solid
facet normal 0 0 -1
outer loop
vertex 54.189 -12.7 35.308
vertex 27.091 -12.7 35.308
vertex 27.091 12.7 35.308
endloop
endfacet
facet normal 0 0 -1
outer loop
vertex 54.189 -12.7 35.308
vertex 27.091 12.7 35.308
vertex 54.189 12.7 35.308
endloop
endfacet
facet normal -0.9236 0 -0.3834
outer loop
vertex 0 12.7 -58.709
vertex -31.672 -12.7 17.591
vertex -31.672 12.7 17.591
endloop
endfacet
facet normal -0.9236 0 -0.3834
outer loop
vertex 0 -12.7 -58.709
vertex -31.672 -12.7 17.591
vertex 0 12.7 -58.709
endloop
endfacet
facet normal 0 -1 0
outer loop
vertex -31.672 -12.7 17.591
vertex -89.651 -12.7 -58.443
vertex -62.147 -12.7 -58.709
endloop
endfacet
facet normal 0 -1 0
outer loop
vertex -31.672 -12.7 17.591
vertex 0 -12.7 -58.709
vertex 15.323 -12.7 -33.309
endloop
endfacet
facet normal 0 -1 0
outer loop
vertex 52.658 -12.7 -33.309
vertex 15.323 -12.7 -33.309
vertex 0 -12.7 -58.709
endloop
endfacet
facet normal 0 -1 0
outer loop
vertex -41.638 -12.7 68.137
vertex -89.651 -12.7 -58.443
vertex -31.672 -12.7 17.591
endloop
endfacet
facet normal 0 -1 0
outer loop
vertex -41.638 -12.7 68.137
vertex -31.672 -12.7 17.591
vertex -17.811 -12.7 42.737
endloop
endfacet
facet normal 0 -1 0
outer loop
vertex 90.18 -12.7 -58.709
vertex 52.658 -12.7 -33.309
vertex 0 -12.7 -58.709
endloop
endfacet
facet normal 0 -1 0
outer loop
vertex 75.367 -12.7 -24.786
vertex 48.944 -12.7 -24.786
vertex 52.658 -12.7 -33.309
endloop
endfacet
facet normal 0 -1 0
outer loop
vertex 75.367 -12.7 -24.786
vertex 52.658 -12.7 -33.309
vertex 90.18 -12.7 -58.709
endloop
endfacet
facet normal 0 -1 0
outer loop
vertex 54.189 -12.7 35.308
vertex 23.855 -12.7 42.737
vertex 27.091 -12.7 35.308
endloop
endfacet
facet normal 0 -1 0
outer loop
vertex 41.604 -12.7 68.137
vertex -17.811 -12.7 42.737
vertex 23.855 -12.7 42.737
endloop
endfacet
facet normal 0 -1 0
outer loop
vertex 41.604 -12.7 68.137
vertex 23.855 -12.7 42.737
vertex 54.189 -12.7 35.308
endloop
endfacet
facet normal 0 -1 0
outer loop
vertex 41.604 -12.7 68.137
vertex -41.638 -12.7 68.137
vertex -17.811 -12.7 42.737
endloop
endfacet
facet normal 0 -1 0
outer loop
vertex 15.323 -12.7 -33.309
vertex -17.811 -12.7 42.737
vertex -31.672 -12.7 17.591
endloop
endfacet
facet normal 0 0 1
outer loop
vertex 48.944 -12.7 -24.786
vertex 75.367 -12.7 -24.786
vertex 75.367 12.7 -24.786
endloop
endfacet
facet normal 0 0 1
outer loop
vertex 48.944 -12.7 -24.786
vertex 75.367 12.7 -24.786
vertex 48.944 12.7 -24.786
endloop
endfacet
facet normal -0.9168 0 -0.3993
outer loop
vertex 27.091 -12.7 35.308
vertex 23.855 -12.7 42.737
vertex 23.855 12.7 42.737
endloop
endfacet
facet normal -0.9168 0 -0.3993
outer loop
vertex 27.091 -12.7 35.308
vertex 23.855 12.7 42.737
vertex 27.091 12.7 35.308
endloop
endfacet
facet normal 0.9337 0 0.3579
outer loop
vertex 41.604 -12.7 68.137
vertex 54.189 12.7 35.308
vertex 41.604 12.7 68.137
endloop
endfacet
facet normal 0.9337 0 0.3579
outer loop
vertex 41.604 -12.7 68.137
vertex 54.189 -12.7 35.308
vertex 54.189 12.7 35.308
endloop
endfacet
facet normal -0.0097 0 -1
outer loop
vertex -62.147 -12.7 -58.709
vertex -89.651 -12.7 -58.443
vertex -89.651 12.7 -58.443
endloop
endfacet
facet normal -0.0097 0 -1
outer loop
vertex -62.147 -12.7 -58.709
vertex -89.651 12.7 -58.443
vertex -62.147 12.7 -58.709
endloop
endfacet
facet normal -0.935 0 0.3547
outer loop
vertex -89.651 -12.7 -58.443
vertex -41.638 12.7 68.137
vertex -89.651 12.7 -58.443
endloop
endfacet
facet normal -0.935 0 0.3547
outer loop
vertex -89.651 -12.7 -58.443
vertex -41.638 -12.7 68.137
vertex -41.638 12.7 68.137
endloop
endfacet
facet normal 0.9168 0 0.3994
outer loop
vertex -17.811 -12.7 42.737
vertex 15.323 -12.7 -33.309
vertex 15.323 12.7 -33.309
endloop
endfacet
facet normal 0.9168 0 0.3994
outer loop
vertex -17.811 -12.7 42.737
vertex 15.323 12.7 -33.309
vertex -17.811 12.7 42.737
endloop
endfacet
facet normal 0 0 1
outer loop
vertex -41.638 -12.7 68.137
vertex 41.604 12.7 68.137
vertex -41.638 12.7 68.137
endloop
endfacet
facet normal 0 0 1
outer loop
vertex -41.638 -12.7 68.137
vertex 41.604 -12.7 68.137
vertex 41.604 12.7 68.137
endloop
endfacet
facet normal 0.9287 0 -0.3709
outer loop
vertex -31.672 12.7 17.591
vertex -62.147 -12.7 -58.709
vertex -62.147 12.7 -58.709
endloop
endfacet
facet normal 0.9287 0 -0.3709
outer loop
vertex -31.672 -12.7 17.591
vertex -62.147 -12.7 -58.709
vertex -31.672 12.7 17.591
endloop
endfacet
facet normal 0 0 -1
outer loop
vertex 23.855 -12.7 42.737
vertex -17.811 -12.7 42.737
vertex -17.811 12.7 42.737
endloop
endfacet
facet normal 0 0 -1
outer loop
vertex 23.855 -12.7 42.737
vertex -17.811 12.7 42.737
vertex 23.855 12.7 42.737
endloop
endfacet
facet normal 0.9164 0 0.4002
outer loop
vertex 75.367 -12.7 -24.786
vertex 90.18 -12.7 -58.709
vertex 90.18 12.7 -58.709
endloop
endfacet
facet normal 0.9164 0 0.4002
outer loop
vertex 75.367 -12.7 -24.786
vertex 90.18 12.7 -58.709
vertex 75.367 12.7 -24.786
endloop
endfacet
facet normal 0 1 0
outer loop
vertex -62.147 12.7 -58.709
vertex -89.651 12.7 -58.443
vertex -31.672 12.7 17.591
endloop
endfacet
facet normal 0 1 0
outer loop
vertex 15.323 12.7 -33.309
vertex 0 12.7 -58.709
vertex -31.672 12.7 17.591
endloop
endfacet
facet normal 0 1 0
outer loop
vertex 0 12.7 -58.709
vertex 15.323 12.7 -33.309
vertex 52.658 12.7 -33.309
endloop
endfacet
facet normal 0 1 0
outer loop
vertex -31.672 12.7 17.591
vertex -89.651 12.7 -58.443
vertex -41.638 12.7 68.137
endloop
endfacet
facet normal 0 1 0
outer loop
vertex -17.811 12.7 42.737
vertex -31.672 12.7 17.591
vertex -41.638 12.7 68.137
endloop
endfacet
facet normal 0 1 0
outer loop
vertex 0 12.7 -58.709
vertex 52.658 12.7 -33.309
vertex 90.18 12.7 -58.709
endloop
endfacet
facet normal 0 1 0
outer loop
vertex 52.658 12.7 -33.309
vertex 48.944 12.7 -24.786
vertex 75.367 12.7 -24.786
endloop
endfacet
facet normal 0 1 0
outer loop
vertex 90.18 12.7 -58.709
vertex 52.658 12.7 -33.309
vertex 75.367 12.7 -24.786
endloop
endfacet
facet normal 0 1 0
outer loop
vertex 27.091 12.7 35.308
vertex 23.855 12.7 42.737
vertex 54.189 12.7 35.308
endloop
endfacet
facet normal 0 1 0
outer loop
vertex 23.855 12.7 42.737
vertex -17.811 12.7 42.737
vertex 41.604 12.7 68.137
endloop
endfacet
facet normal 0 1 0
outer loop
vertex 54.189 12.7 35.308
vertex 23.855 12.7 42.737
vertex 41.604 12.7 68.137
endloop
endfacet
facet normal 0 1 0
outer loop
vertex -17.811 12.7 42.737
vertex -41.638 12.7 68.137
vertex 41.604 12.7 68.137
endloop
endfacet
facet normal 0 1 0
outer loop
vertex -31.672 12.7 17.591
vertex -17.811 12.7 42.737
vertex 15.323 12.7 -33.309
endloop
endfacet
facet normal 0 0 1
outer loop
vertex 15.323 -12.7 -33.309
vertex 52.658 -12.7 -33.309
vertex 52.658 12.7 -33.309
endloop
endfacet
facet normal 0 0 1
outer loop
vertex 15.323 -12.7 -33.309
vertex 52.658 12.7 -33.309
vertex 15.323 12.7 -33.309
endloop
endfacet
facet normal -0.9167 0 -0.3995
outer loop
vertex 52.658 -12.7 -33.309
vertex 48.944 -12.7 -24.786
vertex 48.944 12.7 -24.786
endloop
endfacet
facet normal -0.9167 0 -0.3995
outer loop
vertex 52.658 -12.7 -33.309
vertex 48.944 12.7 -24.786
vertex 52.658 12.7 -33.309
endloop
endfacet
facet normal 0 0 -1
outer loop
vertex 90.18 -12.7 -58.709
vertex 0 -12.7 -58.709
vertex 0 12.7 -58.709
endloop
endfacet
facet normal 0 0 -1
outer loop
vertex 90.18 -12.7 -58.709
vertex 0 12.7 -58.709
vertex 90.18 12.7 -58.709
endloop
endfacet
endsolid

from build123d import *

# Parameters (mm, degrees)
F1_DEPTH = 12.7


with BuildPart() as f1:
    # F0 (on Front) → F1 (new body, symmetric)
    with BuildSketch(Plane.XZ):
        Polygon((-41.637809, 68.136583), (-89.650807, -58.443111), (-62.147316, -58.70938), (-31.672317, 17.590671), (0, -58.70938), (90.179723, -58.70938), (75.366612, -24.786401), (48.944038, -24.786401), (52.657543, -33.30938), (15.323475, -33.30938), (-17.810837, 42.736583), (23.85487, 42.736583), (27.09148, 35.308142), (54.189362, 35.308142), (41.60433, 68.136583), align=None)
    extrude(amount=F1_DEPTH, both=True)


solid = f1.part
